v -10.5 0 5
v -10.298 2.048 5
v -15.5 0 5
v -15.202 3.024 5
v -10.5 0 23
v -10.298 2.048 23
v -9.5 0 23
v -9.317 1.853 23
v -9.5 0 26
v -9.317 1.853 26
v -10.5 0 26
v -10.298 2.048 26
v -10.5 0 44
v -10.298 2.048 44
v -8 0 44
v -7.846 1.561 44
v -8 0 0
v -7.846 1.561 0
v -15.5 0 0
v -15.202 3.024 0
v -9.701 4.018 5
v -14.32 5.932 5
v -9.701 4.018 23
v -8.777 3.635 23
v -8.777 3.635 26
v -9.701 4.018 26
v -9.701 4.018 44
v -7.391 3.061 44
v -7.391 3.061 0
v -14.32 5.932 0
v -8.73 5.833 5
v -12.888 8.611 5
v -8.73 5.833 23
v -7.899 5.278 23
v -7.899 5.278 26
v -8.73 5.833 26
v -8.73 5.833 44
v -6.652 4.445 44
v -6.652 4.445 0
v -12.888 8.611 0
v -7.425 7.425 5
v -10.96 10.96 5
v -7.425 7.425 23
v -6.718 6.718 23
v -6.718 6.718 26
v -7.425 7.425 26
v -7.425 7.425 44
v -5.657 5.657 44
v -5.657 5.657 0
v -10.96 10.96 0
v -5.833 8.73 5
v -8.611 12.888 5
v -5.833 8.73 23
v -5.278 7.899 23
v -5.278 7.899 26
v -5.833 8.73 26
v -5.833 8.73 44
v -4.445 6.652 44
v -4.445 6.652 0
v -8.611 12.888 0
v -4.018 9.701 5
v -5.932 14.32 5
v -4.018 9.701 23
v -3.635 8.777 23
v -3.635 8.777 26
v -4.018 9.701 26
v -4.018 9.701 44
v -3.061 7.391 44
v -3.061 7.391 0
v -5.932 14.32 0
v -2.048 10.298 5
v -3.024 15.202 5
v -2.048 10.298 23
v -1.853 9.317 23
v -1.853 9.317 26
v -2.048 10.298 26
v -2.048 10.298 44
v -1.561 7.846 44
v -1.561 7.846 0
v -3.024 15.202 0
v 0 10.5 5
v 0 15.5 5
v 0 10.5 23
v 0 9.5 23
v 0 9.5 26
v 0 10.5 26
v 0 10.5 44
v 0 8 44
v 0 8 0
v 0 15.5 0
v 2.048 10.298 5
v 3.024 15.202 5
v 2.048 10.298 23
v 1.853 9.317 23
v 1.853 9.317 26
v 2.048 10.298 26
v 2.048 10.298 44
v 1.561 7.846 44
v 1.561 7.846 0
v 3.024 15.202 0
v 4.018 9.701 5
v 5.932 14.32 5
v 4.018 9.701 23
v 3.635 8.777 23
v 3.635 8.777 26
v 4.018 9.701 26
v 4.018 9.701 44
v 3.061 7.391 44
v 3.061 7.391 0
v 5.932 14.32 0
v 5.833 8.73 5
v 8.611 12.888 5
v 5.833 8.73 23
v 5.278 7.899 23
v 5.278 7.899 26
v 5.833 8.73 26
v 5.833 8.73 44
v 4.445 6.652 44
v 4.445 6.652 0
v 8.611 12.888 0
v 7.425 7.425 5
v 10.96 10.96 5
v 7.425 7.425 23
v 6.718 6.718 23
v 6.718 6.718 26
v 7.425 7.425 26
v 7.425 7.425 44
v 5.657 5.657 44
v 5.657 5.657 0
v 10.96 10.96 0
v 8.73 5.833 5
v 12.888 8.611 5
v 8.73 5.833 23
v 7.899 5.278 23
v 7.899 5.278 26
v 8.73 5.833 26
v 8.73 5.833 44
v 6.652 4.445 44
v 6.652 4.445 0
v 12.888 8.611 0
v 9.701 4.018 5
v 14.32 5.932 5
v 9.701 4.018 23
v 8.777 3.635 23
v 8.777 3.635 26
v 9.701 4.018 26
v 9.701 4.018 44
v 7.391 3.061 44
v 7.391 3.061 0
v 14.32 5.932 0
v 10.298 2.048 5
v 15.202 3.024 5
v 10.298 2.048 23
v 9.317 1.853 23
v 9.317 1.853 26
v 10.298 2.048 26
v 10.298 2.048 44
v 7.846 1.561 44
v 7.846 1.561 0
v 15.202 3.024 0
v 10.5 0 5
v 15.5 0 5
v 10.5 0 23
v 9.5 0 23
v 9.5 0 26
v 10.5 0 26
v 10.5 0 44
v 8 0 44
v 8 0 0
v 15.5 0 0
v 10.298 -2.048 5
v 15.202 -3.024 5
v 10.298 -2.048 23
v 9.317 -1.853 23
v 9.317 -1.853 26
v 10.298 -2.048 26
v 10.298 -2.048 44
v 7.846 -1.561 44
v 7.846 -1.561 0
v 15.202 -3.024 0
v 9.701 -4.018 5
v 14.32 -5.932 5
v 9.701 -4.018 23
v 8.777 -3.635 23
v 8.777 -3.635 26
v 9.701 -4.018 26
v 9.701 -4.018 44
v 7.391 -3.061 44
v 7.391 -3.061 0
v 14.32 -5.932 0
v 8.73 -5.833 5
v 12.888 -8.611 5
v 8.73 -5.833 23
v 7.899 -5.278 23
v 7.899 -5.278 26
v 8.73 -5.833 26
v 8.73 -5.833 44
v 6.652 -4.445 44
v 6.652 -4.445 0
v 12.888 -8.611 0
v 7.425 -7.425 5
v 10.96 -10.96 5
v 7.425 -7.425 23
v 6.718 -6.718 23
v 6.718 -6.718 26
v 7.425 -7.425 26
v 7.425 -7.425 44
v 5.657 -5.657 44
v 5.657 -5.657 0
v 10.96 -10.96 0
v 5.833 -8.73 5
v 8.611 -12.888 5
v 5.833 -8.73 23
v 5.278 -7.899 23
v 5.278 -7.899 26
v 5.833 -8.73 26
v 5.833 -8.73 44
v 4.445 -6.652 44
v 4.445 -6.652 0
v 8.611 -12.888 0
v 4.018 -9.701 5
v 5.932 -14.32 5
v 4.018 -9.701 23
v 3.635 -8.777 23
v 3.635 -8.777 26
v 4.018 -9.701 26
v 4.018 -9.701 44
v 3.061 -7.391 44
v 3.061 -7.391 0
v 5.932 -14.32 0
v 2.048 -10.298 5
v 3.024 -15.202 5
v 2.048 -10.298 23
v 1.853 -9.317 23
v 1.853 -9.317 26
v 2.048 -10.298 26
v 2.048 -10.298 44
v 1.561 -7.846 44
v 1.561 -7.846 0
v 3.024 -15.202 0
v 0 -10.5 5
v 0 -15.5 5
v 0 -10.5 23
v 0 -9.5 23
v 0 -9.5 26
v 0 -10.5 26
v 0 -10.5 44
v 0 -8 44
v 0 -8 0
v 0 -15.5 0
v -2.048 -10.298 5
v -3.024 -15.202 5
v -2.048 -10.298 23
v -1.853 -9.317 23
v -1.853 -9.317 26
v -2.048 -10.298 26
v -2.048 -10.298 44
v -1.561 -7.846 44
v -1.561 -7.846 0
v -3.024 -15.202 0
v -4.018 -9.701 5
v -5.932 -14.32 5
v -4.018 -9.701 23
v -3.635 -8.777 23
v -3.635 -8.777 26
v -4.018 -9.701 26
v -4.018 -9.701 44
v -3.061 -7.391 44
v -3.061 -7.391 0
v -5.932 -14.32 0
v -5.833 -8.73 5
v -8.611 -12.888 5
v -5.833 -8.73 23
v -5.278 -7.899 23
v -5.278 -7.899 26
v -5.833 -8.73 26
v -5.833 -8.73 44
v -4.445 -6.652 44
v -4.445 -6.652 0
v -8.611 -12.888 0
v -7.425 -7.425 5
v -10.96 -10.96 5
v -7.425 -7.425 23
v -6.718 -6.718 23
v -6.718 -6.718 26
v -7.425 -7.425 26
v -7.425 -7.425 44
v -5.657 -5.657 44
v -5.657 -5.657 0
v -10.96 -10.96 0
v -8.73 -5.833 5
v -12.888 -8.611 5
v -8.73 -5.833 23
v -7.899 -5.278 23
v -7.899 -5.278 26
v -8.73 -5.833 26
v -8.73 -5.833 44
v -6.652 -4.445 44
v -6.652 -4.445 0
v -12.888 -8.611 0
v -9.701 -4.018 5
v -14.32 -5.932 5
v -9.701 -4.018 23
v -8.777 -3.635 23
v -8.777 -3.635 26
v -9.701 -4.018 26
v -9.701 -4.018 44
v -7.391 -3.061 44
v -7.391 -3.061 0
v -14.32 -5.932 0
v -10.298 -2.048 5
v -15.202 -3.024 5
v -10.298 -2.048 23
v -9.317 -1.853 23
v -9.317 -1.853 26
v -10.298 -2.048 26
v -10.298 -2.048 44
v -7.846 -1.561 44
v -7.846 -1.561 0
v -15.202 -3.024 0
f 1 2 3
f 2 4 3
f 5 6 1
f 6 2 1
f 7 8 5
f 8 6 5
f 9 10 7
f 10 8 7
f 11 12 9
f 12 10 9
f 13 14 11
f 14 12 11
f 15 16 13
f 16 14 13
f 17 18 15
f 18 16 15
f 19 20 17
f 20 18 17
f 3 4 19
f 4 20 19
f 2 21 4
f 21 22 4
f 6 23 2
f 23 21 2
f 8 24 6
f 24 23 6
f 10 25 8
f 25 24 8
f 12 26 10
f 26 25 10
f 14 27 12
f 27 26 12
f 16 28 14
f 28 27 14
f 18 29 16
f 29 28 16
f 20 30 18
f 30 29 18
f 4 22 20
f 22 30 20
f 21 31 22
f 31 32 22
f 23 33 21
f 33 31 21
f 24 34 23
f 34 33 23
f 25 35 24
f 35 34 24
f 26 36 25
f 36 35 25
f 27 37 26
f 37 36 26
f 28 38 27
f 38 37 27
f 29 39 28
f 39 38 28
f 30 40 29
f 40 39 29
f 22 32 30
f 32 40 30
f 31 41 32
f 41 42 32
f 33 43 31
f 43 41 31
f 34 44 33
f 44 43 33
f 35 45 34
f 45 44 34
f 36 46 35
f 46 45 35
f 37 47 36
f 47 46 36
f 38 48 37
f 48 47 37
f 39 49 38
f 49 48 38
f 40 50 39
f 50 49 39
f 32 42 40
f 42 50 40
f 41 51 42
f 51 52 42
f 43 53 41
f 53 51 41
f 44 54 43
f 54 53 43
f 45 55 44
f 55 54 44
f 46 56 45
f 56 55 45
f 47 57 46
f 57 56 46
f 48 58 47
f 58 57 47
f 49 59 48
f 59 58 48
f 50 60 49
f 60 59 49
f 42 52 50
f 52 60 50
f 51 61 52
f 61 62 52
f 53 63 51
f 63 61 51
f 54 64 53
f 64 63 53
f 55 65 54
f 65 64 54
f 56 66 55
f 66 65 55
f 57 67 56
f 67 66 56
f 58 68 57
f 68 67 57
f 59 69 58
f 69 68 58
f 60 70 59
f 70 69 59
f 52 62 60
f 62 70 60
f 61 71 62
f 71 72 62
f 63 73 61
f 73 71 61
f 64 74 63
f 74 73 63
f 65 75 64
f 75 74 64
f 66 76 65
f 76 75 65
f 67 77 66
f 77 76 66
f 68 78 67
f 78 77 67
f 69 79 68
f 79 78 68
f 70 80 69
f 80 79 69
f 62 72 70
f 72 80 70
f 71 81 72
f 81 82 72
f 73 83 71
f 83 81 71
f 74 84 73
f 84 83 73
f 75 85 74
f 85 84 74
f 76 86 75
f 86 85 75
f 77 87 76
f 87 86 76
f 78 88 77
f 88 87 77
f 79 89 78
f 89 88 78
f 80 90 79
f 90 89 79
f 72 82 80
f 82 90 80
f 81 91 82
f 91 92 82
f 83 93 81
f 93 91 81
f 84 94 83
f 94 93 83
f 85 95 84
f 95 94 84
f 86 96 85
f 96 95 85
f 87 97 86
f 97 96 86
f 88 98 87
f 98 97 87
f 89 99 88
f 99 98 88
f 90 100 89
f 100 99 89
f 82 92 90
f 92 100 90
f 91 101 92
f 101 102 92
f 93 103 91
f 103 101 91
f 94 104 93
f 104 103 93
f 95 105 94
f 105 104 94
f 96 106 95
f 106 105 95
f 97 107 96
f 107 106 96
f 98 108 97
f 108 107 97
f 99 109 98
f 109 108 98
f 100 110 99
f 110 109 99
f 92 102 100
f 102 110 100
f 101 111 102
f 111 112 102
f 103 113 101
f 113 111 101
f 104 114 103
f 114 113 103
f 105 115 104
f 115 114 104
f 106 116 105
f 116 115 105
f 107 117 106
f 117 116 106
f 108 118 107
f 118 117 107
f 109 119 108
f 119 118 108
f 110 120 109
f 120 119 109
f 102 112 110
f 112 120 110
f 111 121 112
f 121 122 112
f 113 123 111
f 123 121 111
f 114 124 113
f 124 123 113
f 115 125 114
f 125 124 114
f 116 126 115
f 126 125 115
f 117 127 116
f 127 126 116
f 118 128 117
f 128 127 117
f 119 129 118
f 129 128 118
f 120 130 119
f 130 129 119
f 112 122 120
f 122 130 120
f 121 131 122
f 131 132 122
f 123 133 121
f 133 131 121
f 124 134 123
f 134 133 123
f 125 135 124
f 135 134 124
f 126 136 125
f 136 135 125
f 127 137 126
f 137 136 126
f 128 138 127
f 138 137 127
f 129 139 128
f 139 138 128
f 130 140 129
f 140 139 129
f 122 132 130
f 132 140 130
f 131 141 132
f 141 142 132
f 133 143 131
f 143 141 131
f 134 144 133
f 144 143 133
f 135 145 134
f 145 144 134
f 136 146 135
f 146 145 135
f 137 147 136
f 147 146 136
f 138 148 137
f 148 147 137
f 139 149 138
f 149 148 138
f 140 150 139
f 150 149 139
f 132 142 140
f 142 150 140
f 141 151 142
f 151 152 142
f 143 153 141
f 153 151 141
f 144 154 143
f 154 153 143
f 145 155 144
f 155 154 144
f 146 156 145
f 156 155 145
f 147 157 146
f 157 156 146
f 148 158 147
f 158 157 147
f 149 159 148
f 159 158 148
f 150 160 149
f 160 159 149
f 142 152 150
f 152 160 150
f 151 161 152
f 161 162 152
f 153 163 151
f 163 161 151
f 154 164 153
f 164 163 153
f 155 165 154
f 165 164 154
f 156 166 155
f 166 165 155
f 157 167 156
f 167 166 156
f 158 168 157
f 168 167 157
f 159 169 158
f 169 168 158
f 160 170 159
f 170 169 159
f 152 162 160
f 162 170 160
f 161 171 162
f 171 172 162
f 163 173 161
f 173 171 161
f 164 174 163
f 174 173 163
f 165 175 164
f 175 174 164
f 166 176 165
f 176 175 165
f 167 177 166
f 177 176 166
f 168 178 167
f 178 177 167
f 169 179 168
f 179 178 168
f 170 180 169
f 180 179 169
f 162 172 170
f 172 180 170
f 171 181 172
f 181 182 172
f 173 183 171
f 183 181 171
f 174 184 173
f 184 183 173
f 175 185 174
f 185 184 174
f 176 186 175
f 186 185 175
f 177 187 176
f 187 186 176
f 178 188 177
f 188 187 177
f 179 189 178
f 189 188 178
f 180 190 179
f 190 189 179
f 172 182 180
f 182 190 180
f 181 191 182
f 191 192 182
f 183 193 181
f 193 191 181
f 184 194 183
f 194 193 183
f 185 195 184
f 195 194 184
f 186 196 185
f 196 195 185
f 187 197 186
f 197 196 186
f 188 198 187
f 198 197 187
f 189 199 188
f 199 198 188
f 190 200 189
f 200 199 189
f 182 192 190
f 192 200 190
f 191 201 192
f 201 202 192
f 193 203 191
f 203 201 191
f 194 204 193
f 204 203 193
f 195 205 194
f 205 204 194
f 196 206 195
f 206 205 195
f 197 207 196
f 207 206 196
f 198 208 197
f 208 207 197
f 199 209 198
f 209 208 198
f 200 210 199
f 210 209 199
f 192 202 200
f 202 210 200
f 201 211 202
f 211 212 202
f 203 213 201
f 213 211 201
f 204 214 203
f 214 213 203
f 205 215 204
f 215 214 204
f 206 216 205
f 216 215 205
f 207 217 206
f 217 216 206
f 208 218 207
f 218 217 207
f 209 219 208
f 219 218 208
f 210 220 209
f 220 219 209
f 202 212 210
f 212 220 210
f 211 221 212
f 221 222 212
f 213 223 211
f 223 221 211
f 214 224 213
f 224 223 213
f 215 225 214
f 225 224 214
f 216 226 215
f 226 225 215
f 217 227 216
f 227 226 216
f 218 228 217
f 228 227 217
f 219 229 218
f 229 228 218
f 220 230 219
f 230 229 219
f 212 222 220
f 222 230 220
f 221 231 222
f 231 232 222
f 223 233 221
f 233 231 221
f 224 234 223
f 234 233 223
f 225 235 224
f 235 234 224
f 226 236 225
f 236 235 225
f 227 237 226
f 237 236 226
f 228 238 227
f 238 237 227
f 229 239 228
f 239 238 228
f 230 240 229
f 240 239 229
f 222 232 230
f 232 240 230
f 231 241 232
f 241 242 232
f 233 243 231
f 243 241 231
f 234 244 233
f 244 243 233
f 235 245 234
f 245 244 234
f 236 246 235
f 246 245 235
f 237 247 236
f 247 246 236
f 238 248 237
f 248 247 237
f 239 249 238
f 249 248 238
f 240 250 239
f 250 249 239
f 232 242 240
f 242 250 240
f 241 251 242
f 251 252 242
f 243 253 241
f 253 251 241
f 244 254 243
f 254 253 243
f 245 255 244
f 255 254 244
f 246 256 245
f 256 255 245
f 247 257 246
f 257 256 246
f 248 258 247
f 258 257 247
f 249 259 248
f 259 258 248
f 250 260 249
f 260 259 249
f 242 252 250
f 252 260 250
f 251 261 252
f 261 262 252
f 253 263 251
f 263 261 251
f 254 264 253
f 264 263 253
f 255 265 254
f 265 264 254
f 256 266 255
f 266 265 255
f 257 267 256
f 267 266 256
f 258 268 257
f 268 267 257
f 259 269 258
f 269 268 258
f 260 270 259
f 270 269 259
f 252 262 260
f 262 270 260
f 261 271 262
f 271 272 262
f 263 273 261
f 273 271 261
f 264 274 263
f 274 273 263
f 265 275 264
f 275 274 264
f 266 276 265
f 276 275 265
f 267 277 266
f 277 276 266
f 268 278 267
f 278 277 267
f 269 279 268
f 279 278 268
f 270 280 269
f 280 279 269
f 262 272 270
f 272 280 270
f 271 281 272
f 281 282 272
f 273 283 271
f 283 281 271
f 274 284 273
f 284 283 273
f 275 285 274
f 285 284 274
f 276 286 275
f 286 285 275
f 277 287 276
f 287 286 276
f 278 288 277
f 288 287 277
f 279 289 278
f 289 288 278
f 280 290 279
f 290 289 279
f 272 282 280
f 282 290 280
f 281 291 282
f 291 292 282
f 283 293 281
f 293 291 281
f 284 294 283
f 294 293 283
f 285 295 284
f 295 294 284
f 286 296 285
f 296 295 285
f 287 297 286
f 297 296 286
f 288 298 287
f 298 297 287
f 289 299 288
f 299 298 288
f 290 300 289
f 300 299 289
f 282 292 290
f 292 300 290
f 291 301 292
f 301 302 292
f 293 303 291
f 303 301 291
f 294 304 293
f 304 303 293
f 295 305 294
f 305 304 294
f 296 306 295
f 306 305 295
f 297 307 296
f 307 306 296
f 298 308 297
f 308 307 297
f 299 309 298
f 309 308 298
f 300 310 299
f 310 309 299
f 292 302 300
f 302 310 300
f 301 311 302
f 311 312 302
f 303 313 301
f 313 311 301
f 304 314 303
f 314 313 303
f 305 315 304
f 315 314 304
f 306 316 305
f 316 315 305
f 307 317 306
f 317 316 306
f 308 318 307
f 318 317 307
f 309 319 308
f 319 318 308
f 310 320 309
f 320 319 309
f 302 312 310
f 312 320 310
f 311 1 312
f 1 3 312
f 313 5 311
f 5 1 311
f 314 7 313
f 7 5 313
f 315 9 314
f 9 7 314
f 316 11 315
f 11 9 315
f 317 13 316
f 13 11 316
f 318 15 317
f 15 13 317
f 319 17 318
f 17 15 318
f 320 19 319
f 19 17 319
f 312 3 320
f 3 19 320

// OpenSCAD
$fn = 32;

// ----------------------------------------------------------------------
// Grooved revolve: flanged, bore R8
// ----------------------------------------------------------------------

// --- parameters (mm) ---
bore_r = 8;               // bore radius
outer_r = 10.5;           // outer radius of the body
total_h = 44;             // overall height, Z
wall = 2.5;               // radial wall thickness
groove_w = 3;             // groove width
groove_d = 1;             // groove depth
grooves = 1;              // number of outer grooves
flange_r = 15.5;          // flange radius
flange_h = 5;             // flange height

bbox_x = 2 * flange_r;  // full diameter
bore_d = 2 * bore_r;  // bore diameter
body_d = 2 * outer_r;  // body diameter
flange_d = 2 * flange_r;  // flange diameter
revolve_angle = 360;  // full turn around the Z axis

profile = [[8, 0], [10.5, 0], [15.5, 0], [15.5, 5], [10.5, 5], [10.5, 23], [9.5, 23], [9.5, 26], [10.5, 26], [10.5, 44], [8, 44]];  // primary outline, 11 points, counter clockwise

// --- the one profile operation ---
rotate_extrude(angle = revolve_angle) polygon(points = profile);
